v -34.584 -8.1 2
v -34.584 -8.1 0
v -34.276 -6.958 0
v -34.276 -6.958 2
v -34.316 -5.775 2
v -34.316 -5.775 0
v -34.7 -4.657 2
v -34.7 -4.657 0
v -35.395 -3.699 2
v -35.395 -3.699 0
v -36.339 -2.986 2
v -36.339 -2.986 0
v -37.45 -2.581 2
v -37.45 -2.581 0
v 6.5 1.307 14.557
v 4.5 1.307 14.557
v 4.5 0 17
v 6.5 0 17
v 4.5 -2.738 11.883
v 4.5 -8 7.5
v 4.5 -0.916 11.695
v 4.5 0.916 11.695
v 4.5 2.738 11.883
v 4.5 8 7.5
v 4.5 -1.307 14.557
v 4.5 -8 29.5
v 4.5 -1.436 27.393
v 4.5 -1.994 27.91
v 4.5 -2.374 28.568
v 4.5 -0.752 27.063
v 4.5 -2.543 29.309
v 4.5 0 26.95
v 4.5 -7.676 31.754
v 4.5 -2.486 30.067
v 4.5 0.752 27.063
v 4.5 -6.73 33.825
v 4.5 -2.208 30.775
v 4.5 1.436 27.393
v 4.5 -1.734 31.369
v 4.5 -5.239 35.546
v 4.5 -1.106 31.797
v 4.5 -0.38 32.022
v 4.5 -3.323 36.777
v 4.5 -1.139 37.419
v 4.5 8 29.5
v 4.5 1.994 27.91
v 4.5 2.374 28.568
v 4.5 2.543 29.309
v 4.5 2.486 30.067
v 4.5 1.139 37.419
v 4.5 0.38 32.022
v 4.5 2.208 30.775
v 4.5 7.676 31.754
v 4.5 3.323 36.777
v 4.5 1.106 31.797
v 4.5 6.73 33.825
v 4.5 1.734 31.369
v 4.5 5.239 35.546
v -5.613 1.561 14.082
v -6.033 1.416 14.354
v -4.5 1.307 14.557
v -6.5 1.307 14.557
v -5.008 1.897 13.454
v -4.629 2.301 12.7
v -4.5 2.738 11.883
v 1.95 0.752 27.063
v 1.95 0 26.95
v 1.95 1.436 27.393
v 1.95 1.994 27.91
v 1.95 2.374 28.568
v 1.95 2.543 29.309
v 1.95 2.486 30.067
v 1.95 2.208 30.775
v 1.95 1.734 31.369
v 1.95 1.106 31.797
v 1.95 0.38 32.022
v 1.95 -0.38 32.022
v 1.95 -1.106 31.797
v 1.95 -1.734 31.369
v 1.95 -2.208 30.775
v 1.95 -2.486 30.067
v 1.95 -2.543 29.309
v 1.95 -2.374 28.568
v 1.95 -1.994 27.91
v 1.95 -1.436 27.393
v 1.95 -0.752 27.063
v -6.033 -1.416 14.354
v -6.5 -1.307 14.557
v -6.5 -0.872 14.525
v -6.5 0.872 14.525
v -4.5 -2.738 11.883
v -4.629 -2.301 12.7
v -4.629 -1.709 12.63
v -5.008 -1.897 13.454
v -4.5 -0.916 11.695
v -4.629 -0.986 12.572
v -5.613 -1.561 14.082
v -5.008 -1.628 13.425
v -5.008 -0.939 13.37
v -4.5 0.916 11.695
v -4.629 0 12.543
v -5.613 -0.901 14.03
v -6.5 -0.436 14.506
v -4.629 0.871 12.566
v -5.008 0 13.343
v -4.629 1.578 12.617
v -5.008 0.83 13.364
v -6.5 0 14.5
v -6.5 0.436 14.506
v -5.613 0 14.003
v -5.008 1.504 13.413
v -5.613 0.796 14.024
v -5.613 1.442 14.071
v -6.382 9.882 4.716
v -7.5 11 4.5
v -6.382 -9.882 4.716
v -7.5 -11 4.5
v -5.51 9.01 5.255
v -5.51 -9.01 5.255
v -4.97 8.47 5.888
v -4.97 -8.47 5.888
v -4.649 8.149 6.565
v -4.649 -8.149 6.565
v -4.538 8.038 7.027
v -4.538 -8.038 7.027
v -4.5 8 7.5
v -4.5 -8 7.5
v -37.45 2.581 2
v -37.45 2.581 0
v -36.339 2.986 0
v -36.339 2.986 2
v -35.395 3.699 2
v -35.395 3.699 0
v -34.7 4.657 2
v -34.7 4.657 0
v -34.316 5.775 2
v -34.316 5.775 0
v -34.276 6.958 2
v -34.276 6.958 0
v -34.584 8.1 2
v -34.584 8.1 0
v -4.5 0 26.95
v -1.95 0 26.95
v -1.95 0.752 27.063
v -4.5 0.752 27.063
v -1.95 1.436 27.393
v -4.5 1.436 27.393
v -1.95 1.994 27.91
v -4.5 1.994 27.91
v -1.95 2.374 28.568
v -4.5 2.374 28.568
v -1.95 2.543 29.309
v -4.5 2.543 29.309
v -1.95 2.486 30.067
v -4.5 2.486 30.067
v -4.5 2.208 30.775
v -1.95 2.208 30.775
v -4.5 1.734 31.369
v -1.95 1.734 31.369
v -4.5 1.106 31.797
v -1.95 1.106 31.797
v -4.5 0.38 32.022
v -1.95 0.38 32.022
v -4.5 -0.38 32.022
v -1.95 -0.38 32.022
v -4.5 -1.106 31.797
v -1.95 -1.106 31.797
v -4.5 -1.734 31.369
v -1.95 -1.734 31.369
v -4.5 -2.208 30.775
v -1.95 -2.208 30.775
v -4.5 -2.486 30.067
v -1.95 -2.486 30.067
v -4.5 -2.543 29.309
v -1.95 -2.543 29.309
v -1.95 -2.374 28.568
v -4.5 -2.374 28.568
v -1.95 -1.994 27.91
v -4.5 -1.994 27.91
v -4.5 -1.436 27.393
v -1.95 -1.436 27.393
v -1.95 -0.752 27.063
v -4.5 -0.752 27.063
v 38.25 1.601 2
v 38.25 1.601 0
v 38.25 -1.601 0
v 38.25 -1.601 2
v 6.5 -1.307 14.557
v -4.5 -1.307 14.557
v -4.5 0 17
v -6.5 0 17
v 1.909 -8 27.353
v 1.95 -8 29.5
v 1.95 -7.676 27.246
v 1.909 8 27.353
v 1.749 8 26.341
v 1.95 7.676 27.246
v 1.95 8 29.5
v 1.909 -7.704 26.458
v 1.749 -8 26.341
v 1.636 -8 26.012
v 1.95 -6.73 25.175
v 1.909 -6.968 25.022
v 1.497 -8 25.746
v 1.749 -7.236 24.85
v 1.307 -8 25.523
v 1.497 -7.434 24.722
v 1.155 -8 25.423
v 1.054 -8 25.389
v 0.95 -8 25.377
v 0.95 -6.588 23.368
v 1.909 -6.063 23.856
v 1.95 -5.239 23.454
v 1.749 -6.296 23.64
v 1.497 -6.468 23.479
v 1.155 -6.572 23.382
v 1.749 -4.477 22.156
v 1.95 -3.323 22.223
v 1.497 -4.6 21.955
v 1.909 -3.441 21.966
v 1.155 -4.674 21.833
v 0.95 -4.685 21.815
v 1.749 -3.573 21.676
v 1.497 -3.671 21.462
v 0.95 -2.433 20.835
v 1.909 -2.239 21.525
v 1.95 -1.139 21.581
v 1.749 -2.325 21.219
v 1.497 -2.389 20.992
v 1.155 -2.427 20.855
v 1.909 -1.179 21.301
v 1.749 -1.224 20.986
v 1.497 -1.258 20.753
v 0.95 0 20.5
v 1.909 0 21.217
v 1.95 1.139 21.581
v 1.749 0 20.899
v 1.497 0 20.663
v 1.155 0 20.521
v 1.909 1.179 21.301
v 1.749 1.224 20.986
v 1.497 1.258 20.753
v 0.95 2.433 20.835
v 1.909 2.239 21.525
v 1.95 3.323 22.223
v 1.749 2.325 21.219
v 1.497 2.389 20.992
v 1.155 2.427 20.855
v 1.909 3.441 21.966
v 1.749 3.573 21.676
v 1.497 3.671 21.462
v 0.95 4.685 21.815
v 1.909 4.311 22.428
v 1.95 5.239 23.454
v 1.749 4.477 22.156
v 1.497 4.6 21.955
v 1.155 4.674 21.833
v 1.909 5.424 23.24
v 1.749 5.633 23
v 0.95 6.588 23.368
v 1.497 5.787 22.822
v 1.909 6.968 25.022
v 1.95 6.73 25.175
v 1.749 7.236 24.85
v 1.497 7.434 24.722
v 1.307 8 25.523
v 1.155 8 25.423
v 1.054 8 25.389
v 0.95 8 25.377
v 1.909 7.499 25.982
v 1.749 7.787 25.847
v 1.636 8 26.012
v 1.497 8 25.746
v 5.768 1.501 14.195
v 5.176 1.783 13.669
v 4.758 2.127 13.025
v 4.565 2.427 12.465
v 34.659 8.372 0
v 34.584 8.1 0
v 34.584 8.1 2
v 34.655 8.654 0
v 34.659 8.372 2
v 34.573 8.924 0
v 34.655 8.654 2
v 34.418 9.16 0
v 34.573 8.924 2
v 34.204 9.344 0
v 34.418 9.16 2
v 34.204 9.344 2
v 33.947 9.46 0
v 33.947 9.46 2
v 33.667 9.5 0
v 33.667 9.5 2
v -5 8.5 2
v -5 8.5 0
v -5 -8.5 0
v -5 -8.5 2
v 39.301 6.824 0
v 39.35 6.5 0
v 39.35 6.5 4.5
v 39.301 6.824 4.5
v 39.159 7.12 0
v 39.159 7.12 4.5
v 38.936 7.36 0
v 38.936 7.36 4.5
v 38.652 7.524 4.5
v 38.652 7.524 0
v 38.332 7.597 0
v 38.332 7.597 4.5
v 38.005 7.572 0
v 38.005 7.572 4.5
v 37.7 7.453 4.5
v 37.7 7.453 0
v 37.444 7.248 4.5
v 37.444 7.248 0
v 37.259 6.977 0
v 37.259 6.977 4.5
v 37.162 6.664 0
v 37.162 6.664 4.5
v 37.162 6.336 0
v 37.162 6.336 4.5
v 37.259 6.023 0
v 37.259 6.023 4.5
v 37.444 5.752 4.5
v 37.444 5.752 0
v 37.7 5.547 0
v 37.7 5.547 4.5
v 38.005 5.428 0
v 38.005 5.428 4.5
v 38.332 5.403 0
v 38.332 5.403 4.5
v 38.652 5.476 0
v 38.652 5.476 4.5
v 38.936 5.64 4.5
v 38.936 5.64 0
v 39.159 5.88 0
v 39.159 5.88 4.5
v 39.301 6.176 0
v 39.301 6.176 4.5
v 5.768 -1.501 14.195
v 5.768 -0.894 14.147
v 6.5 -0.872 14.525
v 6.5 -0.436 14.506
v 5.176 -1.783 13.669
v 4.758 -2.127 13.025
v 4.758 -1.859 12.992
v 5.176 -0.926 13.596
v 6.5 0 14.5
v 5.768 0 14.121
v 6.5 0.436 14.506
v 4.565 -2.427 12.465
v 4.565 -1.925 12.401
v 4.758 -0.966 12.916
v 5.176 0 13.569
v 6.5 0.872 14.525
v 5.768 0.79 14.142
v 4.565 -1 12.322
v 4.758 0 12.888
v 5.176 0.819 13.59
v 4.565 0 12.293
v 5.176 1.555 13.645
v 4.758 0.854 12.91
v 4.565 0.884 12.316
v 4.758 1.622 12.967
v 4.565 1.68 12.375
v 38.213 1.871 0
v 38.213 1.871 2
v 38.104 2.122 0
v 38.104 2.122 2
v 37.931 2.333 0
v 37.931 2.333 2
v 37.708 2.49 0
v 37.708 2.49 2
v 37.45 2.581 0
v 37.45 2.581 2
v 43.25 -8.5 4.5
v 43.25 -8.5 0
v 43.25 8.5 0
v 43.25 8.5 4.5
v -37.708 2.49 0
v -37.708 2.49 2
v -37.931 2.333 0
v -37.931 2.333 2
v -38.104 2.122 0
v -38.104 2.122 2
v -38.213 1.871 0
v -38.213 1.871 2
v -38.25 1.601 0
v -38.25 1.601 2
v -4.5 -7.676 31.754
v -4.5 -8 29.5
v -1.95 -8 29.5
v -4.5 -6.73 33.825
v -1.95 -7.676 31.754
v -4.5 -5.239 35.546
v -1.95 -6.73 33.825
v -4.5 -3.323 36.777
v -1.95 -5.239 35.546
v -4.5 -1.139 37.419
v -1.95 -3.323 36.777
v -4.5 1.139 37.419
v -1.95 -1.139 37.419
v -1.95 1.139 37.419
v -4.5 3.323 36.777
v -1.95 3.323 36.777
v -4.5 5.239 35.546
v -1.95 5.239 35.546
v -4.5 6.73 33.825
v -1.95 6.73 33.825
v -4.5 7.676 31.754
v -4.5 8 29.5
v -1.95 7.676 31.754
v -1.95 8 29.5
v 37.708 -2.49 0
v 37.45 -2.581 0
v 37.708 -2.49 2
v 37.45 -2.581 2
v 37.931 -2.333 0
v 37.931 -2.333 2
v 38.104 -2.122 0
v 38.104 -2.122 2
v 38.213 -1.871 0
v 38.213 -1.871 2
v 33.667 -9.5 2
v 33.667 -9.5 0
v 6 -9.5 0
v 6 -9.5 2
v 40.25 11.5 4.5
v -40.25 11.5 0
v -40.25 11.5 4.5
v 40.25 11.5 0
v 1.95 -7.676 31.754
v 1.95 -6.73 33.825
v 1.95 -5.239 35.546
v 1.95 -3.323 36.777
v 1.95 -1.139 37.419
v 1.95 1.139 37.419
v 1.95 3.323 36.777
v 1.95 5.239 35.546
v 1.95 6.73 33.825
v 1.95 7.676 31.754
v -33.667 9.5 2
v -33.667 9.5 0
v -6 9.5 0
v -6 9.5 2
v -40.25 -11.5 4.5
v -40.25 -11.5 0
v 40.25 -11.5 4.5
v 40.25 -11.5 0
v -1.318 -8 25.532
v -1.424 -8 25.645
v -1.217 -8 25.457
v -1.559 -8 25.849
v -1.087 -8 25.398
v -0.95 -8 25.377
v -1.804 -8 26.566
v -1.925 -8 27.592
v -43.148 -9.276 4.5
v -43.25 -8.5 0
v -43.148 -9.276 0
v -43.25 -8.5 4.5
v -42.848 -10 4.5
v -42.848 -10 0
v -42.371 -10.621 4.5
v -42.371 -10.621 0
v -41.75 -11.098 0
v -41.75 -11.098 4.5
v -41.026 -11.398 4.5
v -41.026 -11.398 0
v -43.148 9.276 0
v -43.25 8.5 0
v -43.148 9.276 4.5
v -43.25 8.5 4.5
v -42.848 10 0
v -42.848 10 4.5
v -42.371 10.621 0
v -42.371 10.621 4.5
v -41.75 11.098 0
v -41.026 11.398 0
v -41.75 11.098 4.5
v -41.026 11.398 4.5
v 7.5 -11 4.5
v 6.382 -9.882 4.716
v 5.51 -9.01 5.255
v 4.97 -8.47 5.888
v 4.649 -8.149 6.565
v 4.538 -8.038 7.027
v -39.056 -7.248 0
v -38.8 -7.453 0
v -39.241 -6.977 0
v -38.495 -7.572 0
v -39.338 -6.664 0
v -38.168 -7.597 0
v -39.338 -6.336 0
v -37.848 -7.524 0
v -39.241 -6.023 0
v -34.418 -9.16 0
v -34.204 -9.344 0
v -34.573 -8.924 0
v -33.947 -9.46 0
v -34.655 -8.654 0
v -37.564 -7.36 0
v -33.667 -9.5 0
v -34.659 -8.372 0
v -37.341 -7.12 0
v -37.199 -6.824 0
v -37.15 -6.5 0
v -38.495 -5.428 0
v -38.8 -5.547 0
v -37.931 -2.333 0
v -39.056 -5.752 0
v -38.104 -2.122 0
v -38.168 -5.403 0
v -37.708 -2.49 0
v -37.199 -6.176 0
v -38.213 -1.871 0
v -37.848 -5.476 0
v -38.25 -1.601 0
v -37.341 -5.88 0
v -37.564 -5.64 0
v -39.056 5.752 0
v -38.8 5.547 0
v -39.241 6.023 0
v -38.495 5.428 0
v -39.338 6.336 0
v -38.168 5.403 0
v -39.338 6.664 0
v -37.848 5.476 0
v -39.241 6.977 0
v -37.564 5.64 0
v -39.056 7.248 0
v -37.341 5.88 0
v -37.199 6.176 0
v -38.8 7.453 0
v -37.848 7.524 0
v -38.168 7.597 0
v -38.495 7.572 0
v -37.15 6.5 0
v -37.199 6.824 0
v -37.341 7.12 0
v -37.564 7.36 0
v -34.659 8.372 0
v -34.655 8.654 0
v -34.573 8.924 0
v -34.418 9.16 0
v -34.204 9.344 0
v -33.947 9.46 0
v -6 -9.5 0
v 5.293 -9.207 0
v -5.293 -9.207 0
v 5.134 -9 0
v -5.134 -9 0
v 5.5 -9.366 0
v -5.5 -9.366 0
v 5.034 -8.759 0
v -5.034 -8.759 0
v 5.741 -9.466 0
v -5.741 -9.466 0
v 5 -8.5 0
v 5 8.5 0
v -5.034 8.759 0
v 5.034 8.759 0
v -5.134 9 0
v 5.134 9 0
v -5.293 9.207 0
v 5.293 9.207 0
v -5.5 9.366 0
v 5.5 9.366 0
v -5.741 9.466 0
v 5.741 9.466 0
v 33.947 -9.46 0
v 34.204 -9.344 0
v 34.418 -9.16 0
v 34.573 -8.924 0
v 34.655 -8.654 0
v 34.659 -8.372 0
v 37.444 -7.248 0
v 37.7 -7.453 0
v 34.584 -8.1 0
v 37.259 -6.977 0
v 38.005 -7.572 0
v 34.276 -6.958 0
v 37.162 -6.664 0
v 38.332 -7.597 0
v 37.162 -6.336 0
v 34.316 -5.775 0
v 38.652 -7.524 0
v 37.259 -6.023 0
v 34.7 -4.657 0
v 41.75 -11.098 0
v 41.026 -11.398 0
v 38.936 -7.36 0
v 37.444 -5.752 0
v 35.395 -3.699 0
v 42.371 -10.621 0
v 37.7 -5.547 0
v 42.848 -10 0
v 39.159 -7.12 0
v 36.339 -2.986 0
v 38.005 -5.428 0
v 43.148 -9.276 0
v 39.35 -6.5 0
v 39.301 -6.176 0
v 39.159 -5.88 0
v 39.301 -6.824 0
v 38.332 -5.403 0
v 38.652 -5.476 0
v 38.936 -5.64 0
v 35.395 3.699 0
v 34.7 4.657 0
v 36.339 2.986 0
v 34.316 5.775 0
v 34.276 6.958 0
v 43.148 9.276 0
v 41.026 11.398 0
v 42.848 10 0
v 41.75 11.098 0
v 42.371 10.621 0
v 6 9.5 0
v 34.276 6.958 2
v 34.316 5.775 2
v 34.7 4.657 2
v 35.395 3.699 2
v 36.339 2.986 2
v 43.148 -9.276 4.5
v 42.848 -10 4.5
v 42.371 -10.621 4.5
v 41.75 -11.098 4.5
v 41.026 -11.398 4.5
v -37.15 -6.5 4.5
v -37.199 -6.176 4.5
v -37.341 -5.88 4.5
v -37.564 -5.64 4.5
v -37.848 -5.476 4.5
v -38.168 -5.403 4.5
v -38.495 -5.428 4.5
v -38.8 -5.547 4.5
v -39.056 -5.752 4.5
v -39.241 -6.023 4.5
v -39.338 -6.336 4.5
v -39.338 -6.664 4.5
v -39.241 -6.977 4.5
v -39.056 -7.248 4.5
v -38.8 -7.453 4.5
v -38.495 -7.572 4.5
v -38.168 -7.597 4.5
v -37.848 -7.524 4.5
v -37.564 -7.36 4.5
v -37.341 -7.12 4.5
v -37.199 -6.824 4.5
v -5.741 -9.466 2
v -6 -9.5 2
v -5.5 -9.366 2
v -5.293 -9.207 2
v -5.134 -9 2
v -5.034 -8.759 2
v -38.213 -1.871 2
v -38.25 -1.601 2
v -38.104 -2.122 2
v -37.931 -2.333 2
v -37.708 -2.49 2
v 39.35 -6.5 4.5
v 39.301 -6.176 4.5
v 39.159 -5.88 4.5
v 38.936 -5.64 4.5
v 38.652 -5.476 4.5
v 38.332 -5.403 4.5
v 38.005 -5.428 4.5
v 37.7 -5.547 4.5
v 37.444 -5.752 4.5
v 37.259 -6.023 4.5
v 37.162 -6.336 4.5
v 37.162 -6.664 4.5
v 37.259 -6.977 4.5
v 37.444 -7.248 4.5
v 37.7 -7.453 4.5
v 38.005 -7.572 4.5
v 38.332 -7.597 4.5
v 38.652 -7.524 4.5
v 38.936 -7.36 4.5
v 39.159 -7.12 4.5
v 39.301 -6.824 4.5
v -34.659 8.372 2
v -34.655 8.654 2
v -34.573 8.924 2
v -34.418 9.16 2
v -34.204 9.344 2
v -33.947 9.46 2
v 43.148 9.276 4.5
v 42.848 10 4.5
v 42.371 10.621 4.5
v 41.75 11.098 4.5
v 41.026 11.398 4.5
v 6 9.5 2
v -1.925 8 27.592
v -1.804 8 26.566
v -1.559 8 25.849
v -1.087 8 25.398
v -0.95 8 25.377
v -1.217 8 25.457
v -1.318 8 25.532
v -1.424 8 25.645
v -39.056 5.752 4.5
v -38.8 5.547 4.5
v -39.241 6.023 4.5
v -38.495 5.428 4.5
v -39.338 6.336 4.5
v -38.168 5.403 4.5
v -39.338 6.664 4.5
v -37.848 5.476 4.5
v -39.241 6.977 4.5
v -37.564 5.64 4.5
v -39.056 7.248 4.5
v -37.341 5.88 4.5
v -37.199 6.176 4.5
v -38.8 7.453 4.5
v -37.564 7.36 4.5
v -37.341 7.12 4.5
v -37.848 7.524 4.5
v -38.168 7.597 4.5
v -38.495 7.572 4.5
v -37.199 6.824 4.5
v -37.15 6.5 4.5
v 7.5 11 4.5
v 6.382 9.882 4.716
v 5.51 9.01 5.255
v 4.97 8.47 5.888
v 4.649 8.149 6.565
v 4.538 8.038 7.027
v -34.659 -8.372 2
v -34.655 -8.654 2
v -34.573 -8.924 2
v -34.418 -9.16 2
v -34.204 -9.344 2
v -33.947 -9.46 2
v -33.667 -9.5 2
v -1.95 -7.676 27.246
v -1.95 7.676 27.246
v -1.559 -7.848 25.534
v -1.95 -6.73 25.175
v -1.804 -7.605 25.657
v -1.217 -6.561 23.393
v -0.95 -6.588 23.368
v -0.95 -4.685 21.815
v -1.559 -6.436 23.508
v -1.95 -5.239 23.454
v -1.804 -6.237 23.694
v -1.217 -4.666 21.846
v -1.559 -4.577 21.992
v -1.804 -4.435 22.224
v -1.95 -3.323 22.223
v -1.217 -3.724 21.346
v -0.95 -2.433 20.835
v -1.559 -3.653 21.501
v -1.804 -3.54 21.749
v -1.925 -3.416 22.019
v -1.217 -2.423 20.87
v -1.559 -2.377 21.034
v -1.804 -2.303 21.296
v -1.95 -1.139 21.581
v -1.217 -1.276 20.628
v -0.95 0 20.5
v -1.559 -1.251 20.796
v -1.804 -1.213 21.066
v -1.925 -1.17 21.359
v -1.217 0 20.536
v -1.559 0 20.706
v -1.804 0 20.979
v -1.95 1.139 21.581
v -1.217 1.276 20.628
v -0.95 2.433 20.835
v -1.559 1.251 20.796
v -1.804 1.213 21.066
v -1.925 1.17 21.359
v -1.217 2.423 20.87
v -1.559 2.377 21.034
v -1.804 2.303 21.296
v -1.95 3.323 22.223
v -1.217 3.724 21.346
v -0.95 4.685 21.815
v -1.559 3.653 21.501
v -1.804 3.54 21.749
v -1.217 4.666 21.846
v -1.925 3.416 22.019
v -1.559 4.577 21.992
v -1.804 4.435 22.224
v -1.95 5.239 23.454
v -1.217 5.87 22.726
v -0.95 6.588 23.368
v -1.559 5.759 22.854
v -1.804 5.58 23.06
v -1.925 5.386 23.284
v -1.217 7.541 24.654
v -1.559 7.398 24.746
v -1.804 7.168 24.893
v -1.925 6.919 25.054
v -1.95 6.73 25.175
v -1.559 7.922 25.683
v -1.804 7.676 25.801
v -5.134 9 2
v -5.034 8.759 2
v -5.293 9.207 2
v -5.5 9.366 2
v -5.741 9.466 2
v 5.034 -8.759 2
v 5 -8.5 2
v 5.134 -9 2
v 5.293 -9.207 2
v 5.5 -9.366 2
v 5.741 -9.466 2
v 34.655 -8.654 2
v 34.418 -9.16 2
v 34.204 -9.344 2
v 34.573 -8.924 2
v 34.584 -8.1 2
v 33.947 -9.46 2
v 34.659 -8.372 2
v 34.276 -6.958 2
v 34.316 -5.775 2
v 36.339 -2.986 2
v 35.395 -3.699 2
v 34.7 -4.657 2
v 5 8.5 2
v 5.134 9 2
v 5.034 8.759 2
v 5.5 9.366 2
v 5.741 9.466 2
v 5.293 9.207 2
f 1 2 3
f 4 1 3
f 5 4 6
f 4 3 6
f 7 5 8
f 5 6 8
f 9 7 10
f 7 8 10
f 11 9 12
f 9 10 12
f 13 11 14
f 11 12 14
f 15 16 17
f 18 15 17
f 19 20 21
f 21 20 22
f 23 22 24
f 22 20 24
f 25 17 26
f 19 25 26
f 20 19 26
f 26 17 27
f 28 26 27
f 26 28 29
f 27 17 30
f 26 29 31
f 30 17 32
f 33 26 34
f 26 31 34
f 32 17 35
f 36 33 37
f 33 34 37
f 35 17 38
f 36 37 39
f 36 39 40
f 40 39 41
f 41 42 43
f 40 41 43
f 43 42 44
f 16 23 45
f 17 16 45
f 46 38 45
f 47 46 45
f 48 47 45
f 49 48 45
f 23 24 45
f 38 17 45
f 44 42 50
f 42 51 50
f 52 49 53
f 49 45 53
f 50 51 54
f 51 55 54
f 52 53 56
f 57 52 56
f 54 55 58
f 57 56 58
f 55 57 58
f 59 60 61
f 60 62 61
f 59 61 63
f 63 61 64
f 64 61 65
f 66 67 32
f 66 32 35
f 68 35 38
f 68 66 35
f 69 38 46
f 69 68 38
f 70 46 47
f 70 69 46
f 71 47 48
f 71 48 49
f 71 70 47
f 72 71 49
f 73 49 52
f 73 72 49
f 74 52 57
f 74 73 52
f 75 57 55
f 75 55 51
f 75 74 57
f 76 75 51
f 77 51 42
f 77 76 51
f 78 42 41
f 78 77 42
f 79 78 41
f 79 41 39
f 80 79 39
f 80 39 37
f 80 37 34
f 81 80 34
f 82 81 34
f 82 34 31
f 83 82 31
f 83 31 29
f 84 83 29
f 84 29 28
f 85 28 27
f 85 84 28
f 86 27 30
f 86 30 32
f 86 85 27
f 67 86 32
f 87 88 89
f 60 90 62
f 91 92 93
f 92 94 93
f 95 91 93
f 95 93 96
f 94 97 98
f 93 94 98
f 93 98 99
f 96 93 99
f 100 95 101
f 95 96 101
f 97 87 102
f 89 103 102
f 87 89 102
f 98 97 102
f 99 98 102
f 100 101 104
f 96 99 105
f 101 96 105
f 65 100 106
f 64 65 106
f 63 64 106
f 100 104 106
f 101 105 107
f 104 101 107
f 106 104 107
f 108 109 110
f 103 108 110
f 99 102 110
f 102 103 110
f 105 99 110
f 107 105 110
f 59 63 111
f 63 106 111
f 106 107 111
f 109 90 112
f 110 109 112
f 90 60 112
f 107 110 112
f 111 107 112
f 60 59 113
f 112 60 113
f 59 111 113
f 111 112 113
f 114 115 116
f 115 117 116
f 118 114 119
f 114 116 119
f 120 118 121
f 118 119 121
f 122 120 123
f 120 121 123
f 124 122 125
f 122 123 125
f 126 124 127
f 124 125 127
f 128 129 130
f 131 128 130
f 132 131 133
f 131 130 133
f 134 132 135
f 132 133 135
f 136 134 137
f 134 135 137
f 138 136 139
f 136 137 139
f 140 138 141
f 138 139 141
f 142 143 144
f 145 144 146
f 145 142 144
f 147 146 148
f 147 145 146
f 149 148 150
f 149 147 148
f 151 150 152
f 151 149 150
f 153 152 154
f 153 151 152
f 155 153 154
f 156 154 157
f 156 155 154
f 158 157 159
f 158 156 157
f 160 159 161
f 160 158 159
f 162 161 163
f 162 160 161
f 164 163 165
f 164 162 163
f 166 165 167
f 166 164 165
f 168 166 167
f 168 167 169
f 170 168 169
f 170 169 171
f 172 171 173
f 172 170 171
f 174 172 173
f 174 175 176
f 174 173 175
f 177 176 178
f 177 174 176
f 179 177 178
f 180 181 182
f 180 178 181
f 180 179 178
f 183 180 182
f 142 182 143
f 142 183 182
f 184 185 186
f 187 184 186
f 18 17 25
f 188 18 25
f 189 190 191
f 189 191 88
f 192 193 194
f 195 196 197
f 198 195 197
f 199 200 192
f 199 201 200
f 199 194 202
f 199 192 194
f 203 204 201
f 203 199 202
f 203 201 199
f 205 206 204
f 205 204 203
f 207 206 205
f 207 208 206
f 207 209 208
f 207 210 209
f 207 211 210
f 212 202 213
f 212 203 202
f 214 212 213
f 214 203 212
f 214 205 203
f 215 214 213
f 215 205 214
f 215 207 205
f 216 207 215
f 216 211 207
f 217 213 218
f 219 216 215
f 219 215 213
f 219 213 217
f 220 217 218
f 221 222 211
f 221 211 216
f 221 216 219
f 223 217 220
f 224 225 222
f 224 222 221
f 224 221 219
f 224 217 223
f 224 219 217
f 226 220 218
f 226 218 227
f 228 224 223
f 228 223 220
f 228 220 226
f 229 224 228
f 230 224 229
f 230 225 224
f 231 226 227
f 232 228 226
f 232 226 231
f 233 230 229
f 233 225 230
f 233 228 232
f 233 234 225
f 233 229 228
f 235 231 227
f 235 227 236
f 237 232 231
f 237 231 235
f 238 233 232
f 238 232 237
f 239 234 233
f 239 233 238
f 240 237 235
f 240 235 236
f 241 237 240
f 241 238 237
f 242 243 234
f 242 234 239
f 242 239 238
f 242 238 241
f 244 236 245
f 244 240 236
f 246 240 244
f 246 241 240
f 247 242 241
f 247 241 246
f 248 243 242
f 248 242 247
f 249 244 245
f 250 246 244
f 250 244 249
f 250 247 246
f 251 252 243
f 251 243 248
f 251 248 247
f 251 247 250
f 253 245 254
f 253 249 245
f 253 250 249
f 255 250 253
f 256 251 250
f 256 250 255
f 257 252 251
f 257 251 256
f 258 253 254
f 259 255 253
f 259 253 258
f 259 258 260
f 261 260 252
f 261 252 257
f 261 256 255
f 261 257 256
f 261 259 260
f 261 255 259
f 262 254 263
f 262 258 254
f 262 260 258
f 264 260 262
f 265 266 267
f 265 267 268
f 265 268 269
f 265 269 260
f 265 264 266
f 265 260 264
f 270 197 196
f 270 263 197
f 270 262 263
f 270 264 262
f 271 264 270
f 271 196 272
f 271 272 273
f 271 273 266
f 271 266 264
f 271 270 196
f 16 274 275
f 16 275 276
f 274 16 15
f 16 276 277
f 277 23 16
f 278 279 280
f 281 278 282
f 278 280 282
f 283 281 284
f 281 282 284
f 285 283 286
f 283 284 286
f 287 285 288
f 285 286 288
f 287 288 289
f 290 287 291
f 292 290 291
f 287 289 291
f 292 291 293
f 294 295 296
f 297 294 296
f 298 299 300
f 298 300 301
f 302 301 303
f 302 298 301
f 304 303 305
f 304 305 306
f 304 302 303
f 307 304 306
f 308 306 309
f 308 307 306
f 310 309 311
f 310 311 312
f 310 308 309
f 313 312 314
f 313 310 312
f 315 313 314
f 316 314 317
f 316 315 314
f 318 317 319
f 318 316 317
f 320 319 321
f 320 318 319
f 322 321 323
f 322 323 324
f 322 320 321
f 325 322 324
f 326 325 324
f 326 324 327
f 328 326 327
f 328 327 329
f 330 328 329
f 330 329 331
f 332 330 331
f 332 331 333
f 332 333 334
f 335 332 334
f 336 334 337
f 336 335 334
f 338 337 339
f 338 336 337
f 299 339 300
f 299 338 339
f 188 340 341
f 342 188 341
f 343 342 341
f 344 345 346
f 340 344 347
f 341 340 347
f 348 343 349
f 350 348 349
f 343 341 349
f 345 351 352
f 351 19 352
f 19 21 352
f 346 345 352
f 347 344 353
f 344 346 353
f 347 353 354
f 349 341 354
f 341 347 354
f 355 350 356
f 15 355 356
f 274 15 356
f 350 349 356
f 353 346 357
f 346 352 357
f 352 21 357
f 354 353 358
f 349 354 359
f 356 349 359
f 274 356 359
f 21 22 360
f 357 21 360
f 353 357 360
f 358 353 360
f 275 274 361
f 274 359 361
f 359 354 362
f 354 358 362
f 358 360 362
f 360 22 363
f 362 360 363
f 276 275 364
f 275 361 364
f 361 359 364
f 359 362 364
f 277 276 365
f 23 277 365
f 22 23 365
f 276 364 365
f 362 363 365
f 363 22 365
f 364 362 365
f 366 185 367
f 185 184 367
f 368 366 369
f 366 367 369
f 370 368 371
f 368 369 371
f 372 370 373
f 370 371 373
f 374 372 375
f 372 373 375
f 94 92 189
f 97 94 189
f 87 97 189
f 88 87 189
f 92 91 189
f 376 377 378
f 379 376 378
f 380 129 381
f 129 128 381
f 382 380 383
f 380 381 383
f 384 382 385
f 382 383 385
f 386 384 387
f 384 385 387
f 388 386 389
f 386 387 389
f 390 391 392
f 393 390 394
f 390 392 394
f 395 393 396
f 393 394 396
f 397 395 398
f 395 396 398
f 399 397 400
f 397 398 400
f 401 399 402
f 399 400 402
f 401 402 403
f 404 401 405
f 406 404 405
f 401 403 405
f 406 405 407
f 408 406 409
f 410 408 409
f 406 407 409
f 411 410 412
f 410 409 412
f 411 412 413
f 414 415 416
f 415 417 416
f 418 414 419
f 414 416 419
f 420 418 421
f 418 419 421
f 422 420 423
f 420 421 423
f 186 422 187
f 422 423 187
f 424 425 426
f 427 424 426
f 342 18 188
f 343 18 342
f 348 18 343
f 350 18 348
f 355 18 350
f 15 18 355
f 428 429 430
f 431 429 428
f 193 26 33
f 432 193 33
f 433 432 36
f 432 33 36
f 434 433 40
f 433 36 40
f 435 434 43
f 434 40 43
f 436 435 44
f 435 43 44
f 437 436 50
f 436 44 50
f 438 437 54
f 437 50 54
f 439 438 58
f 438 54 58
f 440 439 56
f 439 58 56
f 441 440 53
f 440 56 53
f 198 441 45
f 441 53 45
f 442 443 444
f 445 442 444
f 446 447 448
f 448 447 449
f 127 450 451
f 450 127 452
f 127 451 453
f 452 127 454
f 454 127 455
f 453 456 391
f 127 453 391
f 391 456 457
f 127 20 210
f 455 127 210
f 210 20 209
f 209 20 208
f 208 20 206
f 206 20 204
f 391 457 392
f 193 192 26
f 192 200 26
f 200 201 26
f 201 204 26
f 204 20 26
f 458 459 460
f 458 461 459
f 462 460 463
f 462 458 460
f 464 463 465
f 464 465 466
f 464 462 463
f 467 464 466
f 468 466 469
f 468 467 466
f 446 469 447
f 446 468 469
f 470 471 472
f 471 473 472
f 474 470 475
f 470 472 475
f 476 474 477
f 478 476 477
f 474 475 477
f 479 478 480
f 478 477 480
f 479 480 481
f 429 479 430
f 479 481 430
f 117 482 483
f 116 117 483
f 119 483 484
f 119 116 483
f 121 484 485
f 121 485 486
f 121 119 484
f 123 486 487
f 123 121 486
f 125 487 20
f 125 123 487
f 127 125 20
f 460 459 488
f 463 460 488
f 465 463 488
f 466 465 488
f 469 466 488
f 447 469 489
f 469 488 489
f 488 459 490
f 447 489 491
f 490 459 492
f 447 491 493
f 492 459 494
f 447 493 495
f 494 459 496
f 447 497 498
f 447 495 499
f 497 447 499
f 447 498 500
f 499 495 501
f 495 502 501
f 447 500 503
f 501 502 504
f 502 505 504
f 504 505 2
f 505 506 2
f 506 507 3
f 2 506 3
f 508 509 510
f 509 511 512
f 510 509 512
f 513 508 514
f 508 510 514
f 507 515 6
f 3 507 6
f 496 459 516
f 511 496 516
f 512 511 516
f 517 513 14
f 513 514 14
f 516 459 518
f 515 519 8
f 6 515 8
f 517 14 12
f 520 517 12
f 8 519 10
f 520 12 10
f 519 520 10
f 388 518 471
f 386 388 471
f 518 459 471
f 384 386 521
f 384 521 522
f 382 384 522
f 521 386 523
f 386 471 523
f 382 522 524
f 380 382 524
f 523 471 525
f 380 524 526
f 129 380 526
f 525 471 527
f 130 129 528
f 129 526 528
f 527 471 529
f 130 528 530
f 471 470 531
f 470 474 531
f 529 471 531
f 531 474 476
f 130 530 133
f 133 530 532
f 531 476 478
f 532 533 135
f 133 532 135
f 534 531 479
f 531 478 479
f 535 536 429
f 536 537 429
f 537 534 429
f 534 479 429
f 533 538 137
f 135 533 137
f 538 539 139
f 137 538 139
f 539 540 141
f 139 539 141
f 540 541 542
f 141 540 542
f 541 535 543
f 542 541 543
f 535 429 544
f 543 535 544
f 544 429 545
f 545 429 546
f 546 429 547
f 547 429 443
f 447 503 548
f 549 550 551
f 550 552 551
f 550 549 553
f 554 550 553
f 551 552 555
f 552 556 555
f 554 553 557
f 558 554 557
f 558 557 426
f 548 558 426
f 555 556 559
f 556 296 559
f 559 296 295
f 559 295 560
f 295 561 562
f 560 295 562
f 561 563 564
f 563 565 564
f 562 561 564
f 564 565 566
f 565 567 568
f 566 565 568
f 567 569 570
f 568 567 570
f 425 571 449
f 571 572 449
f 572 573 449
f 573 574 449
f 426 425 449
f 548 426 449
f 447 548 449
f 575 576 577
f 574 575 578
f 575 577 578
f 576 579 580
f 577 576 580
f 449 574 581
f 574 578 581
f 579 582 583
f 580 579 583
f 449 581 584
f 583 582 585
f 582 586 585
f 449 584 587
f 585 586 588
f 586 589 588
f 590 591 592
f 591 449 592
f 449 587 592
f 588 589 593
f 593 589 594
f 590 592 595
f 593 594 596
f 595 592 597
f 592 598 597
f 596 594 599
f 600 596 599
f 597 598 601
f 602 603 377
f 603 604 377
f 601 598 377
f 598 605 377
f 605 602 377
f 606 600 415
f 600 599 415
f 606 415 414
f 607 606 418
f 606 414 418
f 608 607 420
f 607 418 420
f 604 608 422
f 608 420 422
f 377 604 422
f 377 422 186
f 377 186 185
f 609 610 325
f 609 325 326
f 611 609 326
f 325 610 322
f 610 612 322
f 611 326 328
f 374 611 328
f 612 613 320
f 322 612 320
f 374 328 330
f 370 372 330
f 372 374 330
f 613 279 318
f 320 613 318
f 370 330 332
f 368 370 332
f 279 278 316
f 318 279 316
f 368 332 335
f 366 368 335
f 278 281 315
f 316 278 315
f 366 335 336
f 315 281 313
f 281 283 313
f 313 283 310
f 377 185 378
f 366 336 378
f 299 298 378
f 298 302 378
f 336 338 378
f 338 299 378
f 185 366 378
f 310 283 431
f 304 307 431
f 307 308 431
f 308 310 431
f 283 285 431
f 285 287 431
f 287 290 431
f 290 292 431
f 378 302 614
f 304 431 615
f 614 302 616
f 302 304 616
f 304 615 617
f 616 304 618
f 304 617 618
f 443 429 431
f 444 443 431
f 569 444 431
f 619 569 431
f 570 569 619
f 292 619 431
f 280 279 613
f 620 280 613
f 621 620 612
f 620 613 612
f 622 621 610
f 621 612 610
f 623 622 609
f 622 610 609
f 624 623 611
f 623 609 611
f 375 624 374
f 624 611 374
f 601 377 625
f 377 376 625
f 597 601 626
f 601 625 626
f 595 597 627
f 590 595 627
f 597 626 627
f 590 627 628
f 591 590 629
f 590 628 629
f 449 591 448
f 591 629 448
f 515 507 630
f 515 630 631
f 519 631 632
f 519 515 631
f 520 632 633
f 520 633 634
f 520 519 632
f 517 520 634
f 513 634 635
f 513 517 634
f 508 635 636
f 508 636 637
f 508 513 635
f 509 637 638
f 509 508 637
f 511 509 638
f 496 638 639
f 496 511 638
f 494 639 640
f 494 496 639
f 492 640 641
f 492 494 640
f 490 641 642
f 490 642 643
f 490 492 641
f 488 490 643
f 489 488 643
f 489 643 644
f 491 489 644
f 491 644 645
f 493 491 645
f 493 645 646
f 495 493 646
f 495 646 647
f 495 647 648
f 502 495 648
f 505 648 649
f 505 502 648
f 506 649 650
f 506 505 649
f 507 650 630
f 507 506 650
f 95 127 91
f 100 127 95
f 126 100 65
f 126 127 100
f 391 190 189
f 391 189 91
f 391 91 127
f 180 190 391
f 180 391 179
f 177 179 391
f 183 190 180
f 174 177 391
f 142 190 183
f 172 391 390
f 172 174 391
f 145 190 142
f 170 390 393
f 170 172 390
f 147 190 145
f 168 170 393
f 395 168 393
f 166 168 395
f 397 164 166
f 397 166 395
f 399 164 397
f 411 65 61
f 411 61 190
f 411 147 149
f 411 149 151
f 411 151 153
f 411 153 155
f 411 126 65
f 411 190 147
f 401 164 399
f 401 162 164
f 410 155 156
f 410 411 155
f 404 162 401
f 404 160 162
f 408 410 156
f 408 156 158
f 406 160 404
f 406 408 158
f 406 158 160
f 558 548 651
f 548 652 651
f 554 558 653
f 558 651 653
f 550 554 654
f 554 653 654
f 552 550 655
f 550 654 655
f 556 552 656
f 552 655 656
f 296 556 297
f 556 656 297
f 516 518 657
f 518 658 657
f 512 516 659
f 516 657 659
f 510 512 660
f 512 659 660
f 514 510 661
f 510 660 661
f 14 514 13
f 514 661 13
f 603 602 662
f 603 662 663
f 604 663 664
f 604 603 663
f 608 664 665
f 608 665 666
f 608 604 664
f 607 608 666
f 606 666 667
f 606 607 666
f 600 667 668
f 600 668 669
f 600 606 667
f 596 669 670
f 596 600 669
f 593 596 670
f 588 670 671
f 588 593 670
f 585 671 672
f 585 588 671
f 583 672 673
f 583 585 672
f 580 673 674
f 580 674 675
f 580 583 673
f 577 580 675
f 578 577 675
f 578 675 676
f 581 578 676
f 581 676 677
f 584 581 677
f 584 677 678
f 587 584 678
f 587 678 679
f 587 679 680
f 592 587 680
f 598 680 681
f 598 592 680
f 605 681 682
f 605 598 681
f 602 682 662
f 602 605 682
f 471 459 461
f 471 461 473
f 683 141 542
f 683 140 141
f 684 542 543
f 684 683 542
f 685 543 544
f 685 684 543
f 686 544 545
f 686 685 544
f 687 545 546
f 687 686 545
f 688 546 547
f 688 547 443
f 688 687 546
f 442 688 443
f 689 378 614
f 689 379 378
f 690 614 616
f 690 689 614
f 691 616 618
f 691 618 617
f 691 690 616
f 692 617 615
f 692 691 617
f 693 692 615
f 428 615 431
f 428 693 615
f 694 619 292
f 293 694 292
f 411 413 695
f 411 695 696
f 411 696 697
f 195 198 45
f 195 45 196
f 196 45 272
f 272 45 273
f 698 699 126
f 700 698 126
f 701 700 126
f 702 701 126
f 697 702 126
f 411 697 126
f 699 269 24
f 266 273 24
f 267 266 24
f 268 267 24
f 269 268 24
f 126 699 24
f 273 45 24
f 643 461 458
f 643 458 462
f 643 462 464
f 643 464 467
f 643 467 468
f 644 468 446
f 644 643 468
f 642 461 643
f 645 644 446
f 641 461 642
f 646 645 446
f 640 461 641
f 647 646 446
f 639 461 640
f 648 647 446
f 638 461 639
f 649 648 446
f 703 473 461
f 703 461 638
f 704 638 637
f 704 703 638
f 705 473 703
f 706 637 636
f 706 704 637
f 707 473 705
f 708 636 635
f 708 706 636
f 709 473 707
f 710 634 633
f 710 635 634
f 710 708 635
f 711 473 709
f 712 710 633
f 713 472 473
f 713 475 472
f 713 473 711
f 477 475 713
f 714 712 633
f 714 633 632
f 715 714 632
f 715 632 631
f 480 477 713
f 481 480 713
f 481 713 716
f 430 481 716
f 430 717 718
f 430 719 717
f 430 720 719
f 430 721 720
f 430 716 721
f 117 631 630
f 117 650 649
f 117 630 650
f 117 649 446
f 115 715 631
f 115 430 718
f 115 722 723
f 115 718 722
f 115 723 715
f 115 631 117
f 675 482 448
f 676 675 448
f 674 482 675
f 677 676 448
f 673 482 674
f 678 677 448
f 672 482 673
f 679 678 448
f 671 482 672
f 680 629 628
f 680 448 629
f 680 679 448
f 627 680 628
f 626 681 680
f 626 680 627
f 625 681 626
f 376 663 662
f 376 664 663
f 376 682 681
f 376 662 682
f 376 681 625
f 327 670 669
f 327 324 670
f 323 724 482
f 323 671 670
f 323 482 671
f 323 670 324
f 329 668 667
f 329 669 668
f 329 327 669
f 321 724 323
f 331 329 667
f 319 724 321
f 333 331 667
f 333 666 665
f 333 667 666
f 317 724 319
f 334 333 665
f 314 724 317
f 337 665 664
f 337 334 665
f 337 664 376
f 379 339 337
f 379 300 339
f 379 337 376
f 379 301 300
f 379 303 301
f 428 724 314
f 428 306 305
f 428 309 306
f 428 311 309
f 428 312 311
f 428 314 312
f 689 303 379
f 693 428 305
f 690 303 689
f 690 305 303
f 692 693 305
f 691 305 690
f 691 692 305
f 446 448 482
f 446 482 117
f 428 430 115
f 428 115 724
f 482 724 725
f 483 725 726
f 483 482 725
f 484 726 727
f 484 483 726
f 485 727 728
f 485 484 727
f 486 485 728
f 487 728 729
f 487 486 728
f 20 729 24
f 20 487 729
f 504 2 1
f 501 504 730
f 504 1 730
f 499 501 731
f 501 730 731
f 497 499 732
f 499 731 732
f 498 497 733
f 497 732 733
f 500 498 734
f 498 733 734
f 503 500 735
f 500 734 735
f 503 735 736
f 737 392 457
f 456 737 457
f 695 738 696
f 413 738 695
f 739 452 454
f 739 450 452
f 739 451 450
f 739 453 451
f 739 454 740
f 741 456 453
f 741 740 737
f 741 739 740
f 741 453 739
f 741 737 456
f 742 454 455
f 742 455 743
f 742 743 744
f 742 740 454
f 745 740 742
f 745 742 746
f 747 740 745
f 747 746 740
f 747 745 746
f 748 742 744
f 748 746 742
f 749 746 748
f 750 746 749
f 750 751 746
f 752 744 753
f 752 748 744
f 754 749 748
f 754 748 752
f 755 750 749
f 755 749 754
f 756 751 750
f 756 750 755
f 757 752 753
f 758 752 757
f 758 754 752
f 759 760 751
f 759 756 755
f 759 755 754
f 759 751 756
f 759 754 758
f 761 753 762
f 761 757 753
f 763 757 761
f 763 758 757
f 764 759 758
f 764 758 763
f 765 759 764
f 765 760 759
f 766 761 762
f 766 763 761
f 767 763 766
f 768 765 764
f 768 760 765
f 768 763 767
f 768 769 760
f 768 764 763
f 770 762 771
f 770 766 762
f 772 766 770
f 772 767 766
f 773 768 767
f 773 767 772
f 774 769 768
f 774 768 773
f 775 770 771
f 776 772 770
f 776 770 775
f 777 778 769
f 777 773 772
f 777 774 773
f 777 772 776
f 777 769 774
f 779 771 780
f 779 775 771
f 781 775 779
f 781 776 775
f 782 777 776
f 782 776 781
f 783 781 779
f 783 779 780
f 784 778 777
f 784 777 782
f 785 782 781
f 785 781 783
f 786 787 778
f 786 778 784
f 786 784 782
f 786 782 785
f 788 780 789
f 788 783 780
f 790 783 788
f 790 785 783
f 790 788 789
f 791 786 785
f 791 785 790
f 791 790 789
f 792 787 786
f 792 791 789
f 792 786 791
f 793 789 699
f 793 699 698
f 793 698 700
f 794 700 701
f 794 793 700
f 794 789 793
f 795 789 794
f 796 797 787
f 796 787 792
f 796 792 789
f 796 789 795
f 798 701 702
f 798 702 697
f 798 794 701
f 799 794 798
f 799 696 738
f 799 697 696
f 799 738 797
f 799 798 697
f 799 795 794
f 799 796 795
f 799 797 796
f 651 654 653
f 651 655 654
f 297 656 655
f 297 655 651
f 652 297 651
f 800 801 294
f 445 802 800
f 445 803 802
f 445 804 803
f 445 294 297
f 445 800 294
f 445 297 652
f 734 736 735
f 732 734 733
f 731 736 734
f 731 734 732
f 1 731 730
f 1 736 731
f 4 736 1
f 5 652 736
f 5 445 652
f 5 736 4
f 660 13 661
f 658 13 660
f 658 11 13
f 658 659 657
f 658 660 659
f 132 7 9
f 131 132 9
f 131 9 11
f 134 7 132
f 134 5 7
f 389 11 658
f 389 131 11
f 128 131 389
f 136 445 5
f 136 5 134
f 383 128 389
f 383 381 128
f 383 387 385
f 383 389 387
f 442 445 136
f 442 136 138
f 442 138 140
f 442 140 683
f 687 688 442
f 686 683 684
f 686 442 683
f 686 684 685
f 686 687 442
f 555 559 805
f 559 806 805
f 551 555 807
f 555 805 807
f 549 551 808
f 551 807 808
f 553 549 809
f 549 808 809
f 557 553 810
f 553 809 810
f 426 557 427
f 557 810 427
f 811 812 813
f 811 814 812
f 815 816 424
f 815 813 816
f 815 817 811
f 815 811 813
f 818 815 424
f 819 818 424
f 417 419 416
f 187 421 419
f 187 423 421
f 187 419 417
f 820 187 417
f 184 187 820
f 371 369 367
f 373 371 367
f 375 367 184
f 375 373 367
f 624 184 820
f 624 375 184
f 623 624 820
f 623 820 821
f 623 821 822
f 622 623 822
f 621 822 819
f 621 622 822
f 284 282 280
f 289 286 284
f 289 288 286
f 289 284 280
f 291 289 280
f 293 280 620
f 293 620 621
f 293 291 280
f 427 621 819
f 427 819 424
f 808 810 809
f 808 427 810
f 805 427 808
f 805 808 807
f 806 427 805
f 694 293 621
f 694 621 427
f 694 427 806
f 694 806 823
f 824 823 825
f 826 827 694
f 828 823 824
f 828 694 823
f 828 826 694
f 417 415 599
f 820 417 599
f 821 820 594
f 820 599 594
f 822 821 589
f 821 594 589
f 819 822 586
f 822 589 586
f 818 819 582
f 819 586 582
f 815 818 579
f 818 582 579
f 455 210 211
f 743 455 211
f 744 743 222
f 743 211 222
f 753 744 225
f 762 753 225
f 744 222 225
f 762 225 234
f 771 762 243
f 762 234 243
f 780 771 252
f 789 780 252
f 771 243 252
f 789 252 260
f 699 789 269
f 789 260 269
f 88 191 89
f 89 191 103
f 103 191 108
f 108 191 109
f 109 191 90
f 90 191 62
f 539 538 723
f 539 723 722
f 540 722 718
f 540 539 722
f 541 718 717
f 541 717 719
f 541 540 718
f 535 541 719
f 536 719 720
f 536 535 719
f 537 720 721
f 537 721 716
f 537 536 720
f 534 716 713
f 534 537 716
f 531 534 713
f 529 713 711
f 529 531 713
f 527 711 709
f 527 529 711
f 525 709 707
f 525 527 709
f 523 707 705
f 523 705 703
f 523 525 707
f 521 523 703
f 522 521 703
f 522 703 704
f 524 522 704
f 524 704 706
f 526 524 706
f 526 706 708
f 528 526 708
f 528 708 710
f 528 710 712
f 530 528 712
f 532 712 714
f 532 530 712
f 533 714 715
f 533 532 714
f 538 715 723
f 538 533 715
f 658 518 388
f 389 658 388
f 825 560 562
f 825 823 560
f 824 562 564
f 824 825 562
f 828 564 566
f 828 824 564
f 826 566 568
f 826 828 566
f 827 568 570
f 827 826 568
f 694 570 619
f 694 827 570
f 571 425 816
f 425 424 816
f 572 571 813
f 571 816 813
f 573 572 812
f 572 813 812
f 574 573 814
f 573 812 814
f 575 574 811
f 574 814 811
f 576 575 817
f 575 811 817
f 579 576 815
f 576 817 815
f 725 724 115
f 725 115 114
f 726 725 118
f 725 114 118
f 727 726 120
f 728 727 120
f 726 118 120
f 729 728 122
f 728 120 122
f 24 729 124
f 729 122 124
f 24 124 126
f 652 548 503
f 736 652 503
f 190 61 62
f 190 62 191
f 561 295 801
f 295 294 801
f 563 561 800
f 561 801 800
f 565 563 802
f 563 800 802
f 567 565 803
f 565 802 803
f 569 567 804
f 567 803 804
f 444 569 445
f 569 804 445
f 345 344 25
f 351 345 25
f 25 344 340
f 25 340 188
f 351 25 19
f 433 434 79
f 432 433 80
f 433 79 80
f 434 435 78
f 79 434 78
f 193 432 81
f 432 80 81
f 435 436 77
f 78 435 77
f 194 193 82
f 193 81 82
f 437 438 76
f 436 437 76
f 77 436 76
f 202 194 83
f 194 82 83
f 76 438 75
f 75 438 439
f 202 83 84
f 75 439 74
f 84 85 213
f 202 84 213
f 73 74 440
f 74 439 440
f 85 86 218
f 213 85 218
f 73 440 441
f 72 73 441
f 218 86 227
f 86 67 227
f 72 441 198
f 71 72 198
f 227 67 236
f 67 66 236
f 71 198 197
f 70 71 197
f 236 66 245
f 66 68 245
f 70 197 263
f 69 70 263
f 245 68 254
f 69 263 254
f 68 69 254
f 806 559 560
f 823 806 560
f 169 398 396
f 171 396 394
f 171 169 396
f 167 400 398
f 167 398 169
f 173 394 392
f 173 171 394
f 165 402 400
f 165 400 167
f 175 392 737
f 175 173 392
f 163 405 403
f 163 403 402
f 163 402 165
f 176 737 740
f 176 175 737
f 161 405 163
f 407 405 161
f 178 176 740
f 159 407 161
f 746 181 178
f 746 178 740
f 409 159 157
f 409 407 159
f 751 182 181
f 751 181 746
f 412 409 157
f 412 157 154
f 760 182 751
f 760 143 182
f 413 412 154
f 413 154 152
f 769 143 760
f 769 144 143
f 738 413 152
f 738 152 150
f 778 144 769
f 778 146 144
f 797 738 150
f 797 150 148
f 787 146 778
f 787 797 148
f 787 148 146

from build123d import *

# Parameters (mm, degrees)
SKETCH1_W           = 86.5
SKETCH1_H           = 23
SKETCH1_R           = 1.1
BOSS_EXTRUDE1_DEPTH = 4.5
CUT_EXTRUDE1_DEPTH  = 2
SKETCH3_R           = 2.55
BOSS_EXTRUDE2_DEPTH = 4.5
SKETCH6_R           = 9
CUT_EXTRUDE3_DEPTH  = 1.95
FILLET1_R           = 3
FILLET2_R           = 1
FILLET3_R           = 1
BOSS_EXTRUDE3_DEPTH = 2
FILLET4_R           = 3


with BuildPart() as part:
    # Sketch1 → Boss-Extrude1 (new body)
    with BuildSketch(Plane.XY):
        Rectangle(SKETCH1_W, SKETCH1_H)
        with Locations((38.25, 6.5)):
            Circle(SKETCH1_R, mode=Mode.SUBTRACT)
        with Locations((38.25, -6.5)):
            Circle(SKETCH1_R, mode=Mode.SUBTRACT)
        with Locations((-38.25, -6.5)):
            Circle(SKETCH1_R, mode=Mode.SUBTRACT)
        with Locations((-38.25, 6.5)):
            Circle(SKETCH1_R, mode=Mode.SUBTRACT)
    extrude(amount=BOSS_EXTRUDE1_DEPTH)

    # Sketch2 → Cut-Extrude1 (cut)
    with BuildSketch(Plane(origin=(0, 0, 0), x_dir=(-1, 0, 0), z_dir=(0, 0, -1))):
        with BuildLine():
            Line((-5, 9.5), (-35.604248689, 9.5))
            ThreePointArc((-35.604248689, 9.5), (-34.508342613, 5.085786438), (-38.25, 2.5))
            Line((-38.25, 2.5), (-38.25, -2.5))
            ThreePointArc((-38.25, -2.5), (-34.508342613, -5.085786438), (-35.604248689, -9.5))
            Line((-35.604248689, -9.5), (-5, -9.5))
            Line((-5, -9.5), (-5, 9.5))
        make_face()
        with BuildLine():
            Line((35.604248689, 9.5), (5, 9.5))
            Line((5, 9.5), (5, -9.5))
            Line((5, -9.5), (35.604248689, -9.5))
            ThreePointArc((35.604248689, -9.5), (34.508342613, -5.085786438), (38.25, -2.5))
            Line((38.25, -2.5), (38.25, 2.5))
            ThreePointArc((38.25, 2.5), (34.508342613, 5.085786438), (35.604248689, 9.5))
        make_face()
    extrude(amount=-CUT_EXTRUDE1_DEPTH, mode=Mode.SUBTRACT)

    # Sketch3 → Boss-Extrude2 (add, symmetric)
    with BuildSketch(Plane(origin=(0, 0, 0), x_dir=(0, 0, -1), z_dir=(1, 0, 0))):
        with BuildLine():
            Line((-29.5, 8), (-4.5, 8))
            Line((-4.5, 8), (-4.5, -8))
            Line((-4.5, -8), (-29.5, -8))
            ThreePointArc((-29.5, -8), (-37.5, 0), (-29.5, 8))
        make_face()
        with Locations((-29.5, 0)):
            Circle(SKETCH3_R, mode=Mode.SUBTRACT)
    extrude(amount=BOSS_EXTRUDE2_DEPTH, both=True)

    # Sketch6 → Cut-Extrude3 (cut, symmetric)
    with BuildSketch(Plane(origin=(0, 0, 0), x_dir=(0, 0, -1), z_dir=(1, 0, 0))):
        with Locations((-29.5, 0)):
            Circle(SKETCH6_R)
    extrude(amount=CUT_EXTRUDE3_DEPTH, both=True, mode=Mode.SUBTRACT)

    # Fillet1
    fillet1_edges = [part.edges().sort_by_distance(p)[0] for p in [
        (4.5, 0, 4.5),
        (-4.5, 0, 4.5),
        (0, -8, 4.5),
        (0, 8, 4.5),
        (43.25, -11.5, 2.25),
        (-43.25, -11.5, 2.25),
        (-43.25, 11.5, 2.25),
        (43.25, 11.5, 2.25),
    ]]
    fillet(fillet1_edges, radius=FILLET1_R)

    # Fillet2
    fillet2_edges = [part.edges().sort_by_distance(p)[0] for p in [
        (1.95, 0, 20.5),
        (-1.95, 0, 20.5),
    ]]
    fillet(fillet2_edges, radius=FILLET2_R)

    # Fillet3
    fillet3_edges = [part.edges().sort_by_distance(p)[0] for p in [
        (35.604248689, -9.5, 1),
        (38.25, -2.5, 1),
        (38.25, 2.5, 1),
        (35.604248689, 9.5, 1),
        (5, 9.5, 1),
        (5, -9.5, 1),
        (-35.604248689, -9.5, 1),
        (-5, -9.5, 1),
        (-5, 9.5, 1),
        (-35.604248689, 9.5, 1),
        (-38.25, 2.5, 1),
        (-38.25, -2.5, 1),
    ]]
    fillet(fillet3_edges, radius=FILLET3_R)

    # Sketch7 → Boss-Extrude3 (add)
    with BuildSketch(Plane(origin=(4.5, 0, 0), x_dir=(0, 0, -1), z_dir=(1, 0, 0))):
        Polygon((-14.557079529, 1.307336141), (-17, 0), (-14.557079529, 0), align=None)
        Polygon((-14.557079529, 0), (-17, 0), (-14.557079529, -1.307336141), align=None)
        with BuildLine():
            Line((-14.557079529, 0), (-14.557079529, -1.307336141))
            ThreePointArc((-14.557079529, -1.307336141), (-14.514276676, -0.65429081), (-14.5, 0))
            Line((-14.5, 0), (-14.557079529, 0))
        make_face()
        with BuildLine():
            ThreePointArc((-14.5, 0), (-14.514276676, 0.65429081), (-14.557079529, 1.307336141))
            Line((-14.557079529, 1.307336141), (-14.557079529, 0))
            Line((-14.557079529, 0), (-14.5, 0))
        make_face()
    boss_extrude3 = extrude(amount=BOSS_EXTRUDE3_DEPTH)

    # Mirror1: Boss-Extrude3 across plane
    add(boss_extrude3.mirror(Plane(origin=(0, 0, 0), x_dir=(0, 0, 1), z_dir=(1, 0, 0))))

    # Fillet4
    # the kernel refuses this fillet: 3 mm, written as the material it adds along each edge
    with BuildSketch(Plane(origin=(4.5, 0, 29.5), x_dir=(0, -0.5300616948891074, -0.8479590789721441), z_dir=(0, -0.8479590789721441, 0.5300616948891074))) as fillet4_piece_1_section:
        with BuildLine():
            CenterArc((17.828427125, 3), FILLET4_R, 199.471220634, 70.528779366)
            Line((15, 2), (14.943431458, 1.98))
            ThreePointArc((14.943431458, 1.98), (14.94, 1), (14.94, 0))
            Line((14.94, 0), (15, -0.06))
            Line((15, -0.06), (17.828427125, -0.06))
            Line((17.828427125, -0.06), (17.828427125, 0))
        make_face()
    fillet4_piece_1 = revolve(axis=Axis((4.5, 0, 29.5), (1, 0, 0)), revolution_arc=64.019246795, mode=Mode.PRIVATE)
    fillet4_piece_1 = split(fillet4_piece_1, bisect_by=Plane(origin=(4.960273163, -1.358360802, 14.461733593), z_dir=(0, 0.8816858925187555, -0.47183682235854135)), keep=Keep.TOP, mode=Mode.PRIVATE)
    fillet4_piece_1 = split(fillet4_piece_1, bisect_by=Plane(origin=(4.960273163, 1.358360693, 14.461733796), z_dir=(0, -0.8816858925186548, -0.4718368223587294)), keep=Keep.TOP, mode=Mode.PRIVATE)
    add(fillet4_piece_1)
    with BuildSketch(Plane(origin=(-4.5, 0, 29.5), x_dir=(0, -0.5300616948891074, -0.8479590789721441), z_dir=(0, -0.8479590789721441, 0.5300616948891074))) as fillet4_piece_2_section:
        with BuildLine():
            CenterArc((17.828427125, -3), FILLET4_R, 90, 70.528779366)
            Line((15, -2), (14.943431458, -1.98))
            ThreePointArc((14.943431458, -1.98), (14.94, -1), (14.94, 0))
            Line((14.94, 0), (15, 0.06))
            Line((15, 0.06), (17.828427125, 0.06))
            Line((17.828427125, 0.06), (17.828427125, 0))
        make_face()
    fillet4_piece_2 = revolve(axis=Axis((-4.5, 0, 29.5), (1, 0, 0)), revolution_arc=64.019246795, mode=Mode.PRIVATE)
    fillet4_piece_2 = split(fillet4_piece_2, bisect_by=Plane(origin=(-4.960273163, -1.358360802, 14.461733593), z_dir=(0, 0.8816858925187555, -0.47183682235854135)), keep=Keep.TOP, mode=Mode.PRIVATE)
    fillet4_piece_2 = split(fillet4_piece_2, bisect_by=Plane(origin=(-4.960273163, 1.358360693, 14.461733796), z_dir=(0, -0.8816858925186548, -0.4718368223587294)), keep=Keep.TOP, mode=Mode.PRIVATE)
    add(fillet4_piece_2)


solid = part.part
